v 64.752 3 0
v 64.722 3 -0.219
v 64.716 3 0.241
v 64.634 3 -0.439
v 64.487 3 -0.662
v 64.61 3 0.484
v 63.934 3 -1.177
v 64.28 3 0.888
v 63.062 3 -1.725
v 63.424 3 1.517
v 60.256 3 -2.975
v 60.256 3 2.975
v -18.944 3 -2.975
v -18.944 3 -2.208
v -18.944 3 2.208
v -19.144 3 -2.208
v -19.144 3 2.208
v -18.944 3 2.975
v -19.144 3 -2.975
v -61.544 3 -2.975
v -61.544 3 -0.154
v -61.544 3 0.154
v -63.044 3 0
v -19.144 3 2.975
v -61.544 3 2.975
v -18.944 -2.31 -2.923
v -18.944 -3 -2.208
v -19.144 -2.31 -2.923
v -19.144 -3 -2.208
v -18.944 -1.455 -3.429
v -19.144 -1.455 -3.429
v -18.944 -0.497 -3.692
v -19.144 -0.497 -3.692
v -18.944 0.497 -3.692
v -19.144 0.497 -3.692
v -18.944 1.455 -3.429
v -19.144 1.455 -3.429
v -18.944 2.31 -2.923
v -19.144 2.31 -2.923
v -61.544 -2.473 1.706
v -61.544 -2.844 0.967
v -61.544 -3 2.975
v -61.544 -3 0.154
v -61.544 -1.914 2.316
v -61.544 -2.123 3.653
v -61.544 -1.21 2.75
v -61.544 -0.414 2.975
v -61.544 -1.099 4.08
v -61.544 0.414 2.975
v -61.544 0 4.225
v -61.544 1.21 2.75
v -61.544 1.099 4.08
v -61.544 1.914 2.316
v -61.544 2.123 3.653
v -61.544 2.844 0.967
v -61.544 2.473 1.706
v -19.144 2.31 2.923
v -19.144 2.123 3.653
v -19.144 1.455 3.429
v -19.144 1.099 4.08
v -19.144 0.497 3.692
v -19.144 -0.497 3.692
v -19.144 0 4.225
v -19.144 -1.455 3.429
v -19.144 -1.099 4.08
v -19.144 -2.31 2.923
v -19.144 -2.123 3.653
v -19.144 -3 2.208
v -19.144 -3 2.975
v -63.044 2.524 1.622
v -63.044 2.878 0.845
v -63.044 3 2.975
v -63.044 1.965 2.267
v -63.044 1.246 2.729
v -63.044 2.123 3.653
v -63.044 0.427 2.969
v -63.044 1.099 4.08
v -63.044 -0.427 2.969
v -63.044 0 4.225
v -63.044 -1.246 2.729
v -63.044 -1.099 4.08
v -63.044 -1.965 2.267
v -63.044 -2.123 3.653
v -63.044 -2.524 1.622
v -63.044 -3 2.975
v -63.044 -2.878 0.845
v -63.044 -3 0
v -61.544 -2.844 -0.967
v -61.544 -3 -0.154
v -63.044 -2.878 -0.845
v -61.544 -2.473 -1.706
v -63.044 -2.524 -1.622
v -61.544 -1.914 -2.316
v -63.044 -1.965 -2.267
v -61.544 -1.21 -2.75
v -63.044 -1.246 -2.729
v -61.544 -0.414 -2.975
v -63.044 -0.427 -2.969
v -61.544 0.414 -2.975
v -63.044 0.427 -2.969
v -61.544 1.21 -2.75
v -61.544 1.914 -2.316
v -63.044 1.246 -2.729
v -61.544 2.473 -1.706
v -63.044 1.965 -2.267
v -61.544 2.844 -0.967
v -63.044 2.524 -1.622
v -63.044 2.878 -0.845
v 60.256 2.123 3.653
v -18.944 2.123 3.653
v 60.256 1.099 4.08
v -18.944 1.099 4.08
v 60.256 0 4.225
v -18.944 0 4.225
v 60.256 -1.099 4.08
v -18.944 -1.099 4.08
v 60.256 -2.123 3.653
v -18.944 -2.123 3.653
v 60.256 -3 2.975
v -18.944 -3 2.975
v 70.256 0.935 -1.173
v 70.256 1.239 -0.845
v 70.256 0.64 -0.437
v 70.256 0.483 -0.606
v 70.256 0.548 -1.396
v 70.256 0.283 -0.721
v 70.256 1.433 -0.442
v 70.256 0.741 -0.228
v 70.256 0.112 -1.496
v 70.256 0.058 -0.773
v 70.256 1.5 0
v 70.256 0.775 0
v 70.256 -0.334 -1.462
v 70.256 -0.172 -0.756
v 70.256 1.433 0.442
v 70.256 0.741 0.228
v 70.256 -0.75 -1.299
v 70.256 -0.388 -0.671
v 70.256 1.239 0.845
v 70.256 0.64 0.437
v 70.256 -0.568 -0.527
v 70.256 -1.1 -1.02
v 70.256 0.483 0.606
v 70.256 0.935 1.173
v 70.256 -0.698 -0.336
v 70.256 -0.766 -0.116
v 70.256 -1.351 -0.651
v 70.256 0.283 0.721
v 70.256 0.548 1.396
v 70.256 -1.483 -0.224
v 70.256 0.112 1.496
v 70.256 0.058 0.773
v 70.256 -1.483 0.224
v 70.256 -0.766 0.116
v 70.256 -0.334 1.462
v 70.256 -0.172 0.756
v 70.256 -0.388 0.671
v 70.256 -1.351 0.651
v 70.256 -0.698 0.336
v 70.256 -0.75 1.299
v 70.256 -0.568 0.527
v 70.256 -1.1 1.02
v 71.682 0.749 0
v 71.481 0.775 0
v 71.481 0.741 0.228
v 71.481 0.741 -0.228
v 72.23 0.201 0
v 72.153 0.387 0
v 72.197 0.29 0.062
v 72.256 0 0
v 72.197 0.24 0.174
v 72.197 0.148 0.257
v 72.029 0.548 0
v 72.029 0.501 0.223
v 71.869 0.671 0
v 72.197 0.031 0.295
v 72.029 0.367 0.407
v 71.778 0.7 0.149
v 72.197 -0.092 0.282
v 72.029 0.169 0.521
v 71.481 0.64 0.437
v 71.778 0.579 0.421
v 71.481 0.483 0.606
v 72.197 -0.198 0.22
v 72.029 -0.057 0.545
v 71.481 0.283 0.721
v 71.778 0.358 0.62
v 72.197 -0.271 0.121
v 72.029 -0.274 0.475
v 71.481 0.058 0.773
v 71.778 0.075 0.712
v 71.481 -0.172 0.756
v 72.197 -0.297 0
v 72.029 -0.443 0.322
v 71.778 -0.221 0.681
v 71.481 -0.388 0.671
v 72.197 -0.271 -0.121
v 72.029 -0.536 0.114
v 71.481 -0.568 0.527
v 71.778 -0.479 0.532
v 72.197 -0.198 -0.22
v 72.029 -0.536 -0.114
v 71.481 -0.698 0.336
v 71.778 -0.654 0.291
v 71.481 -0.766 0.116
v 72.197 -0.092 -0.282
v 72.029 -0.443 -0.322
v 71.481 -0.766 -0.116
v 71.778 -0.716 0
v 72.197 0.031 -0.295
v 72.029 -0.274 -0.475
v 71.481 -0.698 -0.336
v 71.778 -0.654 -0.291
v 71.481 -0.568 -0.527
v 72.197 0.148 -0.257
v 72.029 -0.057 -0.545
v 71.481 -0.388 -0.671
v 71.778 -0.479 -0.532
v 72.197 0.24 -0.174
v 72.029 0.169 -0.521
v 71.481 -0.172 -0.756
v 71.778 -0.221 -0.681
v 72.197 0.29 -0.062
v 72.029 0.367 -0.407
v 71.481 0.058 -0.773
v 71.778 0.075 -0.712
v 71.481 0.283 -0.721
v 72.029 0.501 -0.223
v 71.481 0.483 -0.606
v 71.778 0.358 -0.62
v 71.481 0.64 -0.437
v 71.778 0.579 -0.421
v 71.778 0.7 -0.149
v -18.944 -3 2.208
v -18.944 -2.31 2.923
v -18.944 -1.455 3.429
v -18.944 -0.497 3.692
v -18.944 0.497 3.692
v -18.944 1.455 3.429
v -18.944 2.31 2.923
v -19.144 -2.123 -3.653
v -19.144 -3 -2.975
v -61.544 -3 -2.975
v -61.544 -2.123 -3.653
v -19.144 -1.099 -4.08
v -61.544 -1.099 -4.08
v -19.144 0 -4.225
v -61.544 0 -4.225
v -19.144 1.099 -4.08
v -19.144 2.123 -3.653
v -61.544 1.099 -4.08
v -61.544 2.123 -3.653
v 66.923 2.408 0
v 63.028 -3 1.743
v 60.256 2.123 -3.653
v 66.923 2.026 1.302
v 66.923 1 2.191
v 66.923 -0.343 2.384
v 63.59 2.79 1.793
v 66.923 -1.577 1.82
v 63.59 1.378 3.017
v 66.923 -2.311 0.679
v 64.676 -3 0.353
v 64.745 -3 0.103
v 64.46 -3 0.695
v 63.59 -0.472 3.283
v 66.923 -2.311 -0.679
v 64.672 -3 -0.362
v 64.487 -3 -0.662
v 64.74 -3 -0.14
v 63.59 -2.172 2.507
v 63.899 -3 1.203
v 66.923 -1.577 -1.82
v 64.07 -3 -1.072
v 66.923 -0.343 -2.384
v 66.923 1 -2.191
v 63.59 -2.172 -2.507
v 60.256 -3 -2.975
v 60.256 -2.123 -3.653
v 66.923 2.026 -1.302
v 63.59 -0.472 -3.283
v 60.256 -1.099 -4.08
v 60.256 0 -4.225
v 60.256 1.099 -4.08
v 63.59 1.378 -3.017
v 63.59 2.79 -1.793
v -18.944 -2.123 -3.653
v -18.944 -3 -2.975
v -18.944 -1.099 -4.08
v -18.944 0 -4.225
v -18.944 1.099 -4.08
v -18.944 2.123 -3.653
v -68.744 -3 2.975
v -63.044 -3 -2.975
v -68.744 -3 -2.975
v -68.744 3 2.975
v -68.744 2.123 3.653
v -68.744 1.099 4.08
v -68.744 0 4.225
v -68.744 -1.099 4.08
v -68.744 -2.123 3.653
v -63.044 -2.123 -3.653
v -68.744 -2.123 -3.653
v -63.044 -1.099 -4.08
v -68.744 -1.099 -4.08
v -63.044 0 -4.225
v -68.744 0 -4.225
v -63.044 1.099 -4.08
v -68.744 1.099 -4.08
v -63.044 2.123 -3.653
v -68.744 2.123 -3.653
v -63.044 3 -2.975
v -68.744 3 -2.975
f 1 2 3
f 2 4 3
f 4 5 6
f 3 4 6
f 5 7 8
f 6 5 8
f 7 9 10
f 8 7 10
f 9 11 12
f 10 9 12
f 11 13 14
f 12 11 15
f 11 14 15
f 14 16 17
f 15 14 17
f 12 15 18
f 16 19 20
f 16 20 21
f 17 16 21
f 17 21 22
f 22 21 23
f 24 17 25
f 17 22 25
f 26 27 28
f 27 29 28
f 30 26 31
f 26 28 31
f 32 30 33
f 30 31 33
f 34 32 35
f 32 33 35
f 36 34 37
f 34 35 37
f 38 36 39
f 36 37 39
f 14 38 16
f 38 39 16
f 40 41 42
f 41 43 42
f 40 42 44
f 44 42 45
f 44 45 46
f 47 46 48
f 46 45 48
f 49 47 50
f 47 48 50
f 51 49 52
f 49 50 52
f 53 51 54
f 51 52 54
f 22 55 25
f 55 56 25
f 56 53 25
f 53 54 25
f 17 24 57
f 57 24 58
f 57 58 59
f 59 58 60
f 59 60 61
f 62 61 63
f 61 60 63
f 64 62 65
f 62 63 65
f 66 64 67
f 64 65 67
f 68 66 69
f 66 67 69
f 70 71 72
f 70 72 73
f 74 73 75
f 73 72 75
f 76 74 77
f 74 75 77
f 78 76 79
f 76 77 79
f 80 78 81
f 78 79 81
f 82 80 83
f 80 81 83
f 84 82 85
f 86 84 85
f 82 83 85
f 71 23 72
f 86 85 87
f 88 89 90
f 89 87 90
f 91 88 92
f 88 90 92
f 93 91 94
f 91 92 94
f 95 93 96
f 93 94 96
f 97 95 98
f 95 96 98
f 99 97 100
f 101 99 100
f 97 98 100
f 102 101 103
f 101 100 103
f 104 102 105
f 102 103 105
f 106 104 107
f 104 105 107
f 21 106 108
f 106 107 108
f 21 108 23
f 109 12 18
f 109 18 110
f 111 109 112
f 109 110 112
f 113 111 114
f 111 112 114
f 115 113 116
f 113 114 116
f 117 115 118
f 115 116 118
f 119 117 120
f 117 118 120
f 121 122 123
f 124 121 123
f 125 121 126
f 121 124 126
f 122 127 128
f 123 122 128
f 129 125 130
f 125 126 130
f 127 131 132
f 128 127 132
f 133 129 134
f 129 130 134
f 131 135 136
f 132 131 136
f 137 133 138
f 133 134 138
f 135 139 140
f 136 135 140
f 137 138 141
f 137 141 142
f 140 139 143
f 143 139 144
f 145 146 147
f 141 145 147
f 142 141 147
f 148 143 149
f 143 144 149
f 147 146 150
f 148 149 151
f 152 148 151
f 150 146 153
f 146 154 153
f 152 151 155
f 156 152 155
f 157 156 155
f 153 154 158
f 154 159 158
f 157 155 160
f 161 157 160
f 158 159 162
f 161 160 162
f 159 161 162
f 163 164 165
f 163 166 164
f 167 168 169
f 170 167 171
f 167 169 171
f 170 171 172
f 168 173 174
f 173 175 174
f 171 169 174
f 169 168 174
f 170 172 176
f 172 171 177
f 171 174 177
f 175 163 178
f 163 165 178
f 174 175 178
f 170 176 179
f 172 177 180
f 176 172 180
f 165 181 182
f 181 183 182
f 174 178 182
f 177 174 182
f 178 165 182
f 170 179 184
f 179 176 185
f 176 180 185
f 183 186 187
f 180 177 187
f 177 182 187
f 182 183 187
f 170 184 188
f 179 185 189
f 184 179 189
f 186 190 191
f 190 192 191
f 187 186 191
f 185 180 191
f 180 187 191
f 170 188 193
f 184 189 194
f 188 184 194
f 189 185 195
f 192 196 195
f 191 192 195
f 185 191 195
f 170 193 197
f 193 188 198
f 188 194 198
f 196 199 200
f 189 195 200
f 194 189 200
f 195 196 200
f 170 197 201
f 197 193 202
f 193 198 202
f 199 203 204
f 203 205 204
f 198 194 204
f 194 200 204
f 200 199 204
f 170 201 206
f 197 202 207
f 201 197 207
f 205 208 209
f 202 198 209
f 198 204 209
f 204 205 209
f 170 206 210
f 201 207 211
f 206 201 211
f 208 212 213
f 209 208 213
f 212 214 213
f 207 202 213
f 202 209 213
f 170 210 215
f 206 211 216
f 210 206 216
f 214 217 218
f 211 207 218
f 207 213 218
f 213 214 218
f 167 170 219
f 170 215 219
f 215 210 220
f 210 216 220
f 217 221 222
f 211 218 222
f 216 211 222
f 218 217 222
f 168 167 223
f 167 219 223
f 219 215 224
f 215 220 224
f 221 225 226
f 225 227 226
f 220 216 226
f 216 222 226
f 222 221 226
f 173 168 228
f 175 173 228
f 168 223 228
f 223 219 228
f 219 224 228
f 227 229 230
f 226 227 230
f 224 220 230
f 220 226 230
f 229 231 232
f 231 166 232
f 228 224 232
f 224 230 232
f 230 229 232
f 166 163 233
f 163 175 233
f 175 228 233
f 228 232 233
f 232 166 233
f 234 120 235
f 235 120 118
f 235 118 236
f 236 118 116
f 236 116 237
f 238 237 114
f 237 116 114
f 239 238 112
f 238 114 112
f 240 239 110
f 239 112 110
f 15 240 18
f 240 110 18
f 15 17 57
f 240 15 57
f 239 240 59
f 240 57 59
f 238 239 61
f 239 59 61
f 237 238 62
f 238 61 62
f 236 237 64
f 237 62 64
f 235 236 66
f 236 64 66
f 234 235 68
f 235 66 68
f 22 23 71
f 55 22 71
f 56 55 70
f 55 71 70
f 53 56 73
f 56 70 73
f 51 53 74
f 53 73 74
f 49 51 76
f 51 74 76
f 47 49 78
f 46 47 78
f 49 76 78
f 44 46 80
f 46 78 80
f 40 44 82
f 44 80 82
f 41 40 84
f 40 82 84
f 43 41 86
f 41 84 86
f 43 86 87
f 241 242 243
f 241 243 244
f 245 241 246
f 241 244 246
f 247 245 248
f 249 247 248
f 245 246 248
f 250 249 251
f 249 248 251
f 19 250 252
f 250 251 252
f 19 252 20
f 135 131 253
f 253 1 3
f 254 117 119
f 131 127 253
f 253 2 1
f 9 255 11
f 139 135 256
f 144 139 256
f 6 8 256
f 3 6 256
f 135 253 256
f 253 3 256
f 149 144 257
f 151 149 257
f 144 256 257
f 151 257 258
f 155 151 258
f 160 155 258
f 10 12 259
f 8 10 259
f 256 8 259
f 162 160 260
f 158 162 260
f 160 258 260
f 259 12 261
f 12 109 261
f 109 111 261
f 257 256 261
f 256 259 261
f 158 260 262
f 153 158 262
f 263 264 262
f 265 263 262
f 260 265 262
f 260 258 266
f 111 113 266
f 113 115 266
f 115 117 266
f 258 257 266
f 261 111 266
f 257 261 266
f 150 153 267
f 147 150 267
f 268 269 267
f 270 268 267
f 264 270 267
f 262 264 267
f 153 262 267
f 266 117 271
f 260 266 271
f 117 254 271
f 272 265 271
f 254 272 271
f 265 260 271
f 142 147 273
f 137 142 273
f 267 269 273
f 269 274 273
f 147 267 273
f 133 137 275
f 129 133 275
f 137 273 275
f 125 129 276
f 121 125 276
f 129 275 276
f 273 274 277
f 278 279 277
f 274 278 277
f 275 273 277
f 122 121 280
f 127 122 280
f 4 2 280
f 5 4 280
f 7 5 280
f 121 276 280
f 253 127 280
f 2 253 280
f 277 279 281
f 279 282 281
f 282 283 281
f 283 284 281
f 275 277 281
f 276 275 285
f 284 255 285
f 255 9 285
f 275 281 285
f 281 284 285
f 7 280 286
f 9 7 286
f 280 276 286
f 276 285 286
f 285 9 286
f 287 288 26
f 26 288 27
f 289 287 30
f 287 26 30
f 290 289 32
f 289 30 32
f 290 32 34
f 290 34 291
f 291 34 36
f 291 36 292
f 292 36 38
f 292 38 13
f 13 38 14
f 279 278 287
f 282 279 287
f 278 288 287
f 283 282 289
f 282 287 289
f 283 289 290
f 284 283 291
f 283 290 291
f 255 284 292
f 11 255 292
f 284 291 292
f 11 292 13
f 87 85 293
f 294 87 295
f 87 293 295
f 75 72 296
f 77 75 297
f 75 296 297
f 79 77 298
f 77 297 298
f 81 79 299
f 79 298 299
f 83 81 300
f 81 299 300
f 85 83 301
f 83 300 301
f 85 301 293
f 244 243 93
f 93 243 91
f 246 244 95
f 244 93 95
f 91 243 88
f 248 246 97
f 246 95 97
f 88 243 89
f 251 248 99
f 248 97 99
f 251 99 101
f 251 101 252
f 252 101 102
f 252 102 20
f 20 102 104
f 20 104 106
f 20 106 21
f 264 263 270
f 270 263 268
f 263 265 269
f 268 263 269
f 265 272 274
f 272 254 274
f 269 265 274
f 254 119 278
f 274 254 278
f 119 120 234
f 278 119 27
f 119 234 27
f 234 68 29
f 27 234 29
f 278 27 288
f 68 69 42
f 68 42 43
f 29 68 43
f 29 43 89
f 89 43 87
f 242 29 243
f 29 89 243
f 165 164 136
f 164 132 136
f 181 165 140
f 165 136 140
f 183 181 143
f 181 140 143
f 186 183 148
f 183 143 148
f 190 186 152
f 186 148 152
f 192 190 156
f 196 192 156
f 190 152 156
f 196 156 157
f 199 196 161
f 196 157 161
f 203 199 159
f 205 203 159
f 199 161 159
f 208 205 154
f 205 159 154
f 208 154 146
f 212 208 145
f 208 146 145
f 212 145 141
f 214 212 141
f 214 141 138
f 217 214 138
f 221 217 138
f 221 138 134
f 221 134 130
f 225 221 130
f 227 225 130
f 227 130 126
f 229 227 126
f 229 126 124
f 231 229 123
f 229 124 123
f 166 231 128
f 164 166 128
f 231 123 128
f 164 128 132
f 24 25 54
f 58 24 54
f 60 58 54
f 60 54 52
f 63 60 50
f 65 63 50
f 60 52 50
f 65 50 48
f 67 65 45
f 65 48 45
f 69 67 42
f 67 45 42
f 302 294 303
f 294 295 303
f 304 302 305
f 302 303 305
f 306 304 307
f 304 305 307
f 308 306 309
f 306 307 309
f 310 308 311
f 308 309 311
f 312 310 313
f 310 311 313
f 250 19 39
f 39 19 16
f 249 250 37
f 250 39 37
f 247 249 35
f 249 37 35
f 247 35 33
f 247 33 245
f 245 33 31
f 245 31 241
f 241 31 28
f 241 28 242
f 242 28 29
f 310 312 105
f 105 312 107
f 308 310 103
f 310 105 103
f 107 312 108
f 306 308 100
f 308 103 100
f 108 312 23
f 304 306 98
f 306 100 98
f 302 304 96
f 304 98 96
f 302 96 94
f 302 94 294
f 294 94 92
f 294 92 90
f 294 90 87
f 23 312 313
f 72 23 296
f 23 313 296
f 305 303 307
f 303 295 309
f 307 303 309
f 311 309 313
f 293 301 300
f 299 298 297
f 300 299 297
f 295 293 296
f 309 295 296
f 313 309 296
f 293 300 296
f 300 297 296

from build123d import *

# Parameters (mm, degrees)
F3_DEPTH = 141.001


with BuildPart() as f1:
    # F0 (on Top) → F1 (revolve)
    with BuildSketch(Plane.XY):
        with BuildLine():
            Line((-68.743618687, 4.225), (-68.743618687, 0))
            Line((-68.743618687, 0), (70.256381313, 0))
            Line((70.256381313, 0), (72.256381313, 0))
            ThreePointArc((72.256381313, 0), (72.0293890684, 0.5480077554), (71.481381313, 0.775))
            Line((71.481381313, 0.775), (70.256381313, 0.775))
            Line((70.256381313, 0.775), (70.256381313, 1.5))
            Line((70.256381313, 1.5), (60.256381313, 4.225))
            Line((60.256381313, 4.225), (-18.9439036584, 4.225))
            Line((-18.9439036584, 4.225), (-18.9439036584, 3.725))
            Line((-18.9439036584, 3.725), (-19.1439036584, 3.725))
            Line((-19.1439036584, 3.725), (-19.1439036584, 4.225))
            Line((-19.1439036584, 4.225), (-61.5436239102, 4.225))
            Line((-61.5436239102, 4.225), (-61.5436239102, 3.003958482))
            Line((-61.5436239102, 3.003958482), (-63.043618687, 3))
            Line((-63.043618687, 3), (-63.043618687, 4.225))
            Line((-63.043618687, 4.225), (-68.743618687, 4.225))
        make_face()
    revolve(axis=Axis((0.756381313, 0, 0), (1, 0, 0)))

    # F2 (on face) → F3 (cut, through all)
    with BuildSketch(Plane(origin=(-68.743618687, 0, 0), x_dir=(0, -1, 0), z_dir=(-1, 0, 0))):
        with BuildLine():
            Line((-3, -2.975), (-3, 2.975))
            ThreePointArc((-3, 2.975), (-4.225, 0), (-3, -2.975))
        make_face()
        with BuildLine():
            ThreePointArc((4.225, 0), (3.9067649661, 1.6086679272), (3, 2.975))
            Line((3, 2.975), (3, -2.975))
            ThreePointArc((3, -2.975), (3.9067649661, -1.6086679272), (4.225, 0))
        make_face()
    extrude(amount=-F3_DEPTH, mode=Mode.SUBTRACT)


solid = f1.part
